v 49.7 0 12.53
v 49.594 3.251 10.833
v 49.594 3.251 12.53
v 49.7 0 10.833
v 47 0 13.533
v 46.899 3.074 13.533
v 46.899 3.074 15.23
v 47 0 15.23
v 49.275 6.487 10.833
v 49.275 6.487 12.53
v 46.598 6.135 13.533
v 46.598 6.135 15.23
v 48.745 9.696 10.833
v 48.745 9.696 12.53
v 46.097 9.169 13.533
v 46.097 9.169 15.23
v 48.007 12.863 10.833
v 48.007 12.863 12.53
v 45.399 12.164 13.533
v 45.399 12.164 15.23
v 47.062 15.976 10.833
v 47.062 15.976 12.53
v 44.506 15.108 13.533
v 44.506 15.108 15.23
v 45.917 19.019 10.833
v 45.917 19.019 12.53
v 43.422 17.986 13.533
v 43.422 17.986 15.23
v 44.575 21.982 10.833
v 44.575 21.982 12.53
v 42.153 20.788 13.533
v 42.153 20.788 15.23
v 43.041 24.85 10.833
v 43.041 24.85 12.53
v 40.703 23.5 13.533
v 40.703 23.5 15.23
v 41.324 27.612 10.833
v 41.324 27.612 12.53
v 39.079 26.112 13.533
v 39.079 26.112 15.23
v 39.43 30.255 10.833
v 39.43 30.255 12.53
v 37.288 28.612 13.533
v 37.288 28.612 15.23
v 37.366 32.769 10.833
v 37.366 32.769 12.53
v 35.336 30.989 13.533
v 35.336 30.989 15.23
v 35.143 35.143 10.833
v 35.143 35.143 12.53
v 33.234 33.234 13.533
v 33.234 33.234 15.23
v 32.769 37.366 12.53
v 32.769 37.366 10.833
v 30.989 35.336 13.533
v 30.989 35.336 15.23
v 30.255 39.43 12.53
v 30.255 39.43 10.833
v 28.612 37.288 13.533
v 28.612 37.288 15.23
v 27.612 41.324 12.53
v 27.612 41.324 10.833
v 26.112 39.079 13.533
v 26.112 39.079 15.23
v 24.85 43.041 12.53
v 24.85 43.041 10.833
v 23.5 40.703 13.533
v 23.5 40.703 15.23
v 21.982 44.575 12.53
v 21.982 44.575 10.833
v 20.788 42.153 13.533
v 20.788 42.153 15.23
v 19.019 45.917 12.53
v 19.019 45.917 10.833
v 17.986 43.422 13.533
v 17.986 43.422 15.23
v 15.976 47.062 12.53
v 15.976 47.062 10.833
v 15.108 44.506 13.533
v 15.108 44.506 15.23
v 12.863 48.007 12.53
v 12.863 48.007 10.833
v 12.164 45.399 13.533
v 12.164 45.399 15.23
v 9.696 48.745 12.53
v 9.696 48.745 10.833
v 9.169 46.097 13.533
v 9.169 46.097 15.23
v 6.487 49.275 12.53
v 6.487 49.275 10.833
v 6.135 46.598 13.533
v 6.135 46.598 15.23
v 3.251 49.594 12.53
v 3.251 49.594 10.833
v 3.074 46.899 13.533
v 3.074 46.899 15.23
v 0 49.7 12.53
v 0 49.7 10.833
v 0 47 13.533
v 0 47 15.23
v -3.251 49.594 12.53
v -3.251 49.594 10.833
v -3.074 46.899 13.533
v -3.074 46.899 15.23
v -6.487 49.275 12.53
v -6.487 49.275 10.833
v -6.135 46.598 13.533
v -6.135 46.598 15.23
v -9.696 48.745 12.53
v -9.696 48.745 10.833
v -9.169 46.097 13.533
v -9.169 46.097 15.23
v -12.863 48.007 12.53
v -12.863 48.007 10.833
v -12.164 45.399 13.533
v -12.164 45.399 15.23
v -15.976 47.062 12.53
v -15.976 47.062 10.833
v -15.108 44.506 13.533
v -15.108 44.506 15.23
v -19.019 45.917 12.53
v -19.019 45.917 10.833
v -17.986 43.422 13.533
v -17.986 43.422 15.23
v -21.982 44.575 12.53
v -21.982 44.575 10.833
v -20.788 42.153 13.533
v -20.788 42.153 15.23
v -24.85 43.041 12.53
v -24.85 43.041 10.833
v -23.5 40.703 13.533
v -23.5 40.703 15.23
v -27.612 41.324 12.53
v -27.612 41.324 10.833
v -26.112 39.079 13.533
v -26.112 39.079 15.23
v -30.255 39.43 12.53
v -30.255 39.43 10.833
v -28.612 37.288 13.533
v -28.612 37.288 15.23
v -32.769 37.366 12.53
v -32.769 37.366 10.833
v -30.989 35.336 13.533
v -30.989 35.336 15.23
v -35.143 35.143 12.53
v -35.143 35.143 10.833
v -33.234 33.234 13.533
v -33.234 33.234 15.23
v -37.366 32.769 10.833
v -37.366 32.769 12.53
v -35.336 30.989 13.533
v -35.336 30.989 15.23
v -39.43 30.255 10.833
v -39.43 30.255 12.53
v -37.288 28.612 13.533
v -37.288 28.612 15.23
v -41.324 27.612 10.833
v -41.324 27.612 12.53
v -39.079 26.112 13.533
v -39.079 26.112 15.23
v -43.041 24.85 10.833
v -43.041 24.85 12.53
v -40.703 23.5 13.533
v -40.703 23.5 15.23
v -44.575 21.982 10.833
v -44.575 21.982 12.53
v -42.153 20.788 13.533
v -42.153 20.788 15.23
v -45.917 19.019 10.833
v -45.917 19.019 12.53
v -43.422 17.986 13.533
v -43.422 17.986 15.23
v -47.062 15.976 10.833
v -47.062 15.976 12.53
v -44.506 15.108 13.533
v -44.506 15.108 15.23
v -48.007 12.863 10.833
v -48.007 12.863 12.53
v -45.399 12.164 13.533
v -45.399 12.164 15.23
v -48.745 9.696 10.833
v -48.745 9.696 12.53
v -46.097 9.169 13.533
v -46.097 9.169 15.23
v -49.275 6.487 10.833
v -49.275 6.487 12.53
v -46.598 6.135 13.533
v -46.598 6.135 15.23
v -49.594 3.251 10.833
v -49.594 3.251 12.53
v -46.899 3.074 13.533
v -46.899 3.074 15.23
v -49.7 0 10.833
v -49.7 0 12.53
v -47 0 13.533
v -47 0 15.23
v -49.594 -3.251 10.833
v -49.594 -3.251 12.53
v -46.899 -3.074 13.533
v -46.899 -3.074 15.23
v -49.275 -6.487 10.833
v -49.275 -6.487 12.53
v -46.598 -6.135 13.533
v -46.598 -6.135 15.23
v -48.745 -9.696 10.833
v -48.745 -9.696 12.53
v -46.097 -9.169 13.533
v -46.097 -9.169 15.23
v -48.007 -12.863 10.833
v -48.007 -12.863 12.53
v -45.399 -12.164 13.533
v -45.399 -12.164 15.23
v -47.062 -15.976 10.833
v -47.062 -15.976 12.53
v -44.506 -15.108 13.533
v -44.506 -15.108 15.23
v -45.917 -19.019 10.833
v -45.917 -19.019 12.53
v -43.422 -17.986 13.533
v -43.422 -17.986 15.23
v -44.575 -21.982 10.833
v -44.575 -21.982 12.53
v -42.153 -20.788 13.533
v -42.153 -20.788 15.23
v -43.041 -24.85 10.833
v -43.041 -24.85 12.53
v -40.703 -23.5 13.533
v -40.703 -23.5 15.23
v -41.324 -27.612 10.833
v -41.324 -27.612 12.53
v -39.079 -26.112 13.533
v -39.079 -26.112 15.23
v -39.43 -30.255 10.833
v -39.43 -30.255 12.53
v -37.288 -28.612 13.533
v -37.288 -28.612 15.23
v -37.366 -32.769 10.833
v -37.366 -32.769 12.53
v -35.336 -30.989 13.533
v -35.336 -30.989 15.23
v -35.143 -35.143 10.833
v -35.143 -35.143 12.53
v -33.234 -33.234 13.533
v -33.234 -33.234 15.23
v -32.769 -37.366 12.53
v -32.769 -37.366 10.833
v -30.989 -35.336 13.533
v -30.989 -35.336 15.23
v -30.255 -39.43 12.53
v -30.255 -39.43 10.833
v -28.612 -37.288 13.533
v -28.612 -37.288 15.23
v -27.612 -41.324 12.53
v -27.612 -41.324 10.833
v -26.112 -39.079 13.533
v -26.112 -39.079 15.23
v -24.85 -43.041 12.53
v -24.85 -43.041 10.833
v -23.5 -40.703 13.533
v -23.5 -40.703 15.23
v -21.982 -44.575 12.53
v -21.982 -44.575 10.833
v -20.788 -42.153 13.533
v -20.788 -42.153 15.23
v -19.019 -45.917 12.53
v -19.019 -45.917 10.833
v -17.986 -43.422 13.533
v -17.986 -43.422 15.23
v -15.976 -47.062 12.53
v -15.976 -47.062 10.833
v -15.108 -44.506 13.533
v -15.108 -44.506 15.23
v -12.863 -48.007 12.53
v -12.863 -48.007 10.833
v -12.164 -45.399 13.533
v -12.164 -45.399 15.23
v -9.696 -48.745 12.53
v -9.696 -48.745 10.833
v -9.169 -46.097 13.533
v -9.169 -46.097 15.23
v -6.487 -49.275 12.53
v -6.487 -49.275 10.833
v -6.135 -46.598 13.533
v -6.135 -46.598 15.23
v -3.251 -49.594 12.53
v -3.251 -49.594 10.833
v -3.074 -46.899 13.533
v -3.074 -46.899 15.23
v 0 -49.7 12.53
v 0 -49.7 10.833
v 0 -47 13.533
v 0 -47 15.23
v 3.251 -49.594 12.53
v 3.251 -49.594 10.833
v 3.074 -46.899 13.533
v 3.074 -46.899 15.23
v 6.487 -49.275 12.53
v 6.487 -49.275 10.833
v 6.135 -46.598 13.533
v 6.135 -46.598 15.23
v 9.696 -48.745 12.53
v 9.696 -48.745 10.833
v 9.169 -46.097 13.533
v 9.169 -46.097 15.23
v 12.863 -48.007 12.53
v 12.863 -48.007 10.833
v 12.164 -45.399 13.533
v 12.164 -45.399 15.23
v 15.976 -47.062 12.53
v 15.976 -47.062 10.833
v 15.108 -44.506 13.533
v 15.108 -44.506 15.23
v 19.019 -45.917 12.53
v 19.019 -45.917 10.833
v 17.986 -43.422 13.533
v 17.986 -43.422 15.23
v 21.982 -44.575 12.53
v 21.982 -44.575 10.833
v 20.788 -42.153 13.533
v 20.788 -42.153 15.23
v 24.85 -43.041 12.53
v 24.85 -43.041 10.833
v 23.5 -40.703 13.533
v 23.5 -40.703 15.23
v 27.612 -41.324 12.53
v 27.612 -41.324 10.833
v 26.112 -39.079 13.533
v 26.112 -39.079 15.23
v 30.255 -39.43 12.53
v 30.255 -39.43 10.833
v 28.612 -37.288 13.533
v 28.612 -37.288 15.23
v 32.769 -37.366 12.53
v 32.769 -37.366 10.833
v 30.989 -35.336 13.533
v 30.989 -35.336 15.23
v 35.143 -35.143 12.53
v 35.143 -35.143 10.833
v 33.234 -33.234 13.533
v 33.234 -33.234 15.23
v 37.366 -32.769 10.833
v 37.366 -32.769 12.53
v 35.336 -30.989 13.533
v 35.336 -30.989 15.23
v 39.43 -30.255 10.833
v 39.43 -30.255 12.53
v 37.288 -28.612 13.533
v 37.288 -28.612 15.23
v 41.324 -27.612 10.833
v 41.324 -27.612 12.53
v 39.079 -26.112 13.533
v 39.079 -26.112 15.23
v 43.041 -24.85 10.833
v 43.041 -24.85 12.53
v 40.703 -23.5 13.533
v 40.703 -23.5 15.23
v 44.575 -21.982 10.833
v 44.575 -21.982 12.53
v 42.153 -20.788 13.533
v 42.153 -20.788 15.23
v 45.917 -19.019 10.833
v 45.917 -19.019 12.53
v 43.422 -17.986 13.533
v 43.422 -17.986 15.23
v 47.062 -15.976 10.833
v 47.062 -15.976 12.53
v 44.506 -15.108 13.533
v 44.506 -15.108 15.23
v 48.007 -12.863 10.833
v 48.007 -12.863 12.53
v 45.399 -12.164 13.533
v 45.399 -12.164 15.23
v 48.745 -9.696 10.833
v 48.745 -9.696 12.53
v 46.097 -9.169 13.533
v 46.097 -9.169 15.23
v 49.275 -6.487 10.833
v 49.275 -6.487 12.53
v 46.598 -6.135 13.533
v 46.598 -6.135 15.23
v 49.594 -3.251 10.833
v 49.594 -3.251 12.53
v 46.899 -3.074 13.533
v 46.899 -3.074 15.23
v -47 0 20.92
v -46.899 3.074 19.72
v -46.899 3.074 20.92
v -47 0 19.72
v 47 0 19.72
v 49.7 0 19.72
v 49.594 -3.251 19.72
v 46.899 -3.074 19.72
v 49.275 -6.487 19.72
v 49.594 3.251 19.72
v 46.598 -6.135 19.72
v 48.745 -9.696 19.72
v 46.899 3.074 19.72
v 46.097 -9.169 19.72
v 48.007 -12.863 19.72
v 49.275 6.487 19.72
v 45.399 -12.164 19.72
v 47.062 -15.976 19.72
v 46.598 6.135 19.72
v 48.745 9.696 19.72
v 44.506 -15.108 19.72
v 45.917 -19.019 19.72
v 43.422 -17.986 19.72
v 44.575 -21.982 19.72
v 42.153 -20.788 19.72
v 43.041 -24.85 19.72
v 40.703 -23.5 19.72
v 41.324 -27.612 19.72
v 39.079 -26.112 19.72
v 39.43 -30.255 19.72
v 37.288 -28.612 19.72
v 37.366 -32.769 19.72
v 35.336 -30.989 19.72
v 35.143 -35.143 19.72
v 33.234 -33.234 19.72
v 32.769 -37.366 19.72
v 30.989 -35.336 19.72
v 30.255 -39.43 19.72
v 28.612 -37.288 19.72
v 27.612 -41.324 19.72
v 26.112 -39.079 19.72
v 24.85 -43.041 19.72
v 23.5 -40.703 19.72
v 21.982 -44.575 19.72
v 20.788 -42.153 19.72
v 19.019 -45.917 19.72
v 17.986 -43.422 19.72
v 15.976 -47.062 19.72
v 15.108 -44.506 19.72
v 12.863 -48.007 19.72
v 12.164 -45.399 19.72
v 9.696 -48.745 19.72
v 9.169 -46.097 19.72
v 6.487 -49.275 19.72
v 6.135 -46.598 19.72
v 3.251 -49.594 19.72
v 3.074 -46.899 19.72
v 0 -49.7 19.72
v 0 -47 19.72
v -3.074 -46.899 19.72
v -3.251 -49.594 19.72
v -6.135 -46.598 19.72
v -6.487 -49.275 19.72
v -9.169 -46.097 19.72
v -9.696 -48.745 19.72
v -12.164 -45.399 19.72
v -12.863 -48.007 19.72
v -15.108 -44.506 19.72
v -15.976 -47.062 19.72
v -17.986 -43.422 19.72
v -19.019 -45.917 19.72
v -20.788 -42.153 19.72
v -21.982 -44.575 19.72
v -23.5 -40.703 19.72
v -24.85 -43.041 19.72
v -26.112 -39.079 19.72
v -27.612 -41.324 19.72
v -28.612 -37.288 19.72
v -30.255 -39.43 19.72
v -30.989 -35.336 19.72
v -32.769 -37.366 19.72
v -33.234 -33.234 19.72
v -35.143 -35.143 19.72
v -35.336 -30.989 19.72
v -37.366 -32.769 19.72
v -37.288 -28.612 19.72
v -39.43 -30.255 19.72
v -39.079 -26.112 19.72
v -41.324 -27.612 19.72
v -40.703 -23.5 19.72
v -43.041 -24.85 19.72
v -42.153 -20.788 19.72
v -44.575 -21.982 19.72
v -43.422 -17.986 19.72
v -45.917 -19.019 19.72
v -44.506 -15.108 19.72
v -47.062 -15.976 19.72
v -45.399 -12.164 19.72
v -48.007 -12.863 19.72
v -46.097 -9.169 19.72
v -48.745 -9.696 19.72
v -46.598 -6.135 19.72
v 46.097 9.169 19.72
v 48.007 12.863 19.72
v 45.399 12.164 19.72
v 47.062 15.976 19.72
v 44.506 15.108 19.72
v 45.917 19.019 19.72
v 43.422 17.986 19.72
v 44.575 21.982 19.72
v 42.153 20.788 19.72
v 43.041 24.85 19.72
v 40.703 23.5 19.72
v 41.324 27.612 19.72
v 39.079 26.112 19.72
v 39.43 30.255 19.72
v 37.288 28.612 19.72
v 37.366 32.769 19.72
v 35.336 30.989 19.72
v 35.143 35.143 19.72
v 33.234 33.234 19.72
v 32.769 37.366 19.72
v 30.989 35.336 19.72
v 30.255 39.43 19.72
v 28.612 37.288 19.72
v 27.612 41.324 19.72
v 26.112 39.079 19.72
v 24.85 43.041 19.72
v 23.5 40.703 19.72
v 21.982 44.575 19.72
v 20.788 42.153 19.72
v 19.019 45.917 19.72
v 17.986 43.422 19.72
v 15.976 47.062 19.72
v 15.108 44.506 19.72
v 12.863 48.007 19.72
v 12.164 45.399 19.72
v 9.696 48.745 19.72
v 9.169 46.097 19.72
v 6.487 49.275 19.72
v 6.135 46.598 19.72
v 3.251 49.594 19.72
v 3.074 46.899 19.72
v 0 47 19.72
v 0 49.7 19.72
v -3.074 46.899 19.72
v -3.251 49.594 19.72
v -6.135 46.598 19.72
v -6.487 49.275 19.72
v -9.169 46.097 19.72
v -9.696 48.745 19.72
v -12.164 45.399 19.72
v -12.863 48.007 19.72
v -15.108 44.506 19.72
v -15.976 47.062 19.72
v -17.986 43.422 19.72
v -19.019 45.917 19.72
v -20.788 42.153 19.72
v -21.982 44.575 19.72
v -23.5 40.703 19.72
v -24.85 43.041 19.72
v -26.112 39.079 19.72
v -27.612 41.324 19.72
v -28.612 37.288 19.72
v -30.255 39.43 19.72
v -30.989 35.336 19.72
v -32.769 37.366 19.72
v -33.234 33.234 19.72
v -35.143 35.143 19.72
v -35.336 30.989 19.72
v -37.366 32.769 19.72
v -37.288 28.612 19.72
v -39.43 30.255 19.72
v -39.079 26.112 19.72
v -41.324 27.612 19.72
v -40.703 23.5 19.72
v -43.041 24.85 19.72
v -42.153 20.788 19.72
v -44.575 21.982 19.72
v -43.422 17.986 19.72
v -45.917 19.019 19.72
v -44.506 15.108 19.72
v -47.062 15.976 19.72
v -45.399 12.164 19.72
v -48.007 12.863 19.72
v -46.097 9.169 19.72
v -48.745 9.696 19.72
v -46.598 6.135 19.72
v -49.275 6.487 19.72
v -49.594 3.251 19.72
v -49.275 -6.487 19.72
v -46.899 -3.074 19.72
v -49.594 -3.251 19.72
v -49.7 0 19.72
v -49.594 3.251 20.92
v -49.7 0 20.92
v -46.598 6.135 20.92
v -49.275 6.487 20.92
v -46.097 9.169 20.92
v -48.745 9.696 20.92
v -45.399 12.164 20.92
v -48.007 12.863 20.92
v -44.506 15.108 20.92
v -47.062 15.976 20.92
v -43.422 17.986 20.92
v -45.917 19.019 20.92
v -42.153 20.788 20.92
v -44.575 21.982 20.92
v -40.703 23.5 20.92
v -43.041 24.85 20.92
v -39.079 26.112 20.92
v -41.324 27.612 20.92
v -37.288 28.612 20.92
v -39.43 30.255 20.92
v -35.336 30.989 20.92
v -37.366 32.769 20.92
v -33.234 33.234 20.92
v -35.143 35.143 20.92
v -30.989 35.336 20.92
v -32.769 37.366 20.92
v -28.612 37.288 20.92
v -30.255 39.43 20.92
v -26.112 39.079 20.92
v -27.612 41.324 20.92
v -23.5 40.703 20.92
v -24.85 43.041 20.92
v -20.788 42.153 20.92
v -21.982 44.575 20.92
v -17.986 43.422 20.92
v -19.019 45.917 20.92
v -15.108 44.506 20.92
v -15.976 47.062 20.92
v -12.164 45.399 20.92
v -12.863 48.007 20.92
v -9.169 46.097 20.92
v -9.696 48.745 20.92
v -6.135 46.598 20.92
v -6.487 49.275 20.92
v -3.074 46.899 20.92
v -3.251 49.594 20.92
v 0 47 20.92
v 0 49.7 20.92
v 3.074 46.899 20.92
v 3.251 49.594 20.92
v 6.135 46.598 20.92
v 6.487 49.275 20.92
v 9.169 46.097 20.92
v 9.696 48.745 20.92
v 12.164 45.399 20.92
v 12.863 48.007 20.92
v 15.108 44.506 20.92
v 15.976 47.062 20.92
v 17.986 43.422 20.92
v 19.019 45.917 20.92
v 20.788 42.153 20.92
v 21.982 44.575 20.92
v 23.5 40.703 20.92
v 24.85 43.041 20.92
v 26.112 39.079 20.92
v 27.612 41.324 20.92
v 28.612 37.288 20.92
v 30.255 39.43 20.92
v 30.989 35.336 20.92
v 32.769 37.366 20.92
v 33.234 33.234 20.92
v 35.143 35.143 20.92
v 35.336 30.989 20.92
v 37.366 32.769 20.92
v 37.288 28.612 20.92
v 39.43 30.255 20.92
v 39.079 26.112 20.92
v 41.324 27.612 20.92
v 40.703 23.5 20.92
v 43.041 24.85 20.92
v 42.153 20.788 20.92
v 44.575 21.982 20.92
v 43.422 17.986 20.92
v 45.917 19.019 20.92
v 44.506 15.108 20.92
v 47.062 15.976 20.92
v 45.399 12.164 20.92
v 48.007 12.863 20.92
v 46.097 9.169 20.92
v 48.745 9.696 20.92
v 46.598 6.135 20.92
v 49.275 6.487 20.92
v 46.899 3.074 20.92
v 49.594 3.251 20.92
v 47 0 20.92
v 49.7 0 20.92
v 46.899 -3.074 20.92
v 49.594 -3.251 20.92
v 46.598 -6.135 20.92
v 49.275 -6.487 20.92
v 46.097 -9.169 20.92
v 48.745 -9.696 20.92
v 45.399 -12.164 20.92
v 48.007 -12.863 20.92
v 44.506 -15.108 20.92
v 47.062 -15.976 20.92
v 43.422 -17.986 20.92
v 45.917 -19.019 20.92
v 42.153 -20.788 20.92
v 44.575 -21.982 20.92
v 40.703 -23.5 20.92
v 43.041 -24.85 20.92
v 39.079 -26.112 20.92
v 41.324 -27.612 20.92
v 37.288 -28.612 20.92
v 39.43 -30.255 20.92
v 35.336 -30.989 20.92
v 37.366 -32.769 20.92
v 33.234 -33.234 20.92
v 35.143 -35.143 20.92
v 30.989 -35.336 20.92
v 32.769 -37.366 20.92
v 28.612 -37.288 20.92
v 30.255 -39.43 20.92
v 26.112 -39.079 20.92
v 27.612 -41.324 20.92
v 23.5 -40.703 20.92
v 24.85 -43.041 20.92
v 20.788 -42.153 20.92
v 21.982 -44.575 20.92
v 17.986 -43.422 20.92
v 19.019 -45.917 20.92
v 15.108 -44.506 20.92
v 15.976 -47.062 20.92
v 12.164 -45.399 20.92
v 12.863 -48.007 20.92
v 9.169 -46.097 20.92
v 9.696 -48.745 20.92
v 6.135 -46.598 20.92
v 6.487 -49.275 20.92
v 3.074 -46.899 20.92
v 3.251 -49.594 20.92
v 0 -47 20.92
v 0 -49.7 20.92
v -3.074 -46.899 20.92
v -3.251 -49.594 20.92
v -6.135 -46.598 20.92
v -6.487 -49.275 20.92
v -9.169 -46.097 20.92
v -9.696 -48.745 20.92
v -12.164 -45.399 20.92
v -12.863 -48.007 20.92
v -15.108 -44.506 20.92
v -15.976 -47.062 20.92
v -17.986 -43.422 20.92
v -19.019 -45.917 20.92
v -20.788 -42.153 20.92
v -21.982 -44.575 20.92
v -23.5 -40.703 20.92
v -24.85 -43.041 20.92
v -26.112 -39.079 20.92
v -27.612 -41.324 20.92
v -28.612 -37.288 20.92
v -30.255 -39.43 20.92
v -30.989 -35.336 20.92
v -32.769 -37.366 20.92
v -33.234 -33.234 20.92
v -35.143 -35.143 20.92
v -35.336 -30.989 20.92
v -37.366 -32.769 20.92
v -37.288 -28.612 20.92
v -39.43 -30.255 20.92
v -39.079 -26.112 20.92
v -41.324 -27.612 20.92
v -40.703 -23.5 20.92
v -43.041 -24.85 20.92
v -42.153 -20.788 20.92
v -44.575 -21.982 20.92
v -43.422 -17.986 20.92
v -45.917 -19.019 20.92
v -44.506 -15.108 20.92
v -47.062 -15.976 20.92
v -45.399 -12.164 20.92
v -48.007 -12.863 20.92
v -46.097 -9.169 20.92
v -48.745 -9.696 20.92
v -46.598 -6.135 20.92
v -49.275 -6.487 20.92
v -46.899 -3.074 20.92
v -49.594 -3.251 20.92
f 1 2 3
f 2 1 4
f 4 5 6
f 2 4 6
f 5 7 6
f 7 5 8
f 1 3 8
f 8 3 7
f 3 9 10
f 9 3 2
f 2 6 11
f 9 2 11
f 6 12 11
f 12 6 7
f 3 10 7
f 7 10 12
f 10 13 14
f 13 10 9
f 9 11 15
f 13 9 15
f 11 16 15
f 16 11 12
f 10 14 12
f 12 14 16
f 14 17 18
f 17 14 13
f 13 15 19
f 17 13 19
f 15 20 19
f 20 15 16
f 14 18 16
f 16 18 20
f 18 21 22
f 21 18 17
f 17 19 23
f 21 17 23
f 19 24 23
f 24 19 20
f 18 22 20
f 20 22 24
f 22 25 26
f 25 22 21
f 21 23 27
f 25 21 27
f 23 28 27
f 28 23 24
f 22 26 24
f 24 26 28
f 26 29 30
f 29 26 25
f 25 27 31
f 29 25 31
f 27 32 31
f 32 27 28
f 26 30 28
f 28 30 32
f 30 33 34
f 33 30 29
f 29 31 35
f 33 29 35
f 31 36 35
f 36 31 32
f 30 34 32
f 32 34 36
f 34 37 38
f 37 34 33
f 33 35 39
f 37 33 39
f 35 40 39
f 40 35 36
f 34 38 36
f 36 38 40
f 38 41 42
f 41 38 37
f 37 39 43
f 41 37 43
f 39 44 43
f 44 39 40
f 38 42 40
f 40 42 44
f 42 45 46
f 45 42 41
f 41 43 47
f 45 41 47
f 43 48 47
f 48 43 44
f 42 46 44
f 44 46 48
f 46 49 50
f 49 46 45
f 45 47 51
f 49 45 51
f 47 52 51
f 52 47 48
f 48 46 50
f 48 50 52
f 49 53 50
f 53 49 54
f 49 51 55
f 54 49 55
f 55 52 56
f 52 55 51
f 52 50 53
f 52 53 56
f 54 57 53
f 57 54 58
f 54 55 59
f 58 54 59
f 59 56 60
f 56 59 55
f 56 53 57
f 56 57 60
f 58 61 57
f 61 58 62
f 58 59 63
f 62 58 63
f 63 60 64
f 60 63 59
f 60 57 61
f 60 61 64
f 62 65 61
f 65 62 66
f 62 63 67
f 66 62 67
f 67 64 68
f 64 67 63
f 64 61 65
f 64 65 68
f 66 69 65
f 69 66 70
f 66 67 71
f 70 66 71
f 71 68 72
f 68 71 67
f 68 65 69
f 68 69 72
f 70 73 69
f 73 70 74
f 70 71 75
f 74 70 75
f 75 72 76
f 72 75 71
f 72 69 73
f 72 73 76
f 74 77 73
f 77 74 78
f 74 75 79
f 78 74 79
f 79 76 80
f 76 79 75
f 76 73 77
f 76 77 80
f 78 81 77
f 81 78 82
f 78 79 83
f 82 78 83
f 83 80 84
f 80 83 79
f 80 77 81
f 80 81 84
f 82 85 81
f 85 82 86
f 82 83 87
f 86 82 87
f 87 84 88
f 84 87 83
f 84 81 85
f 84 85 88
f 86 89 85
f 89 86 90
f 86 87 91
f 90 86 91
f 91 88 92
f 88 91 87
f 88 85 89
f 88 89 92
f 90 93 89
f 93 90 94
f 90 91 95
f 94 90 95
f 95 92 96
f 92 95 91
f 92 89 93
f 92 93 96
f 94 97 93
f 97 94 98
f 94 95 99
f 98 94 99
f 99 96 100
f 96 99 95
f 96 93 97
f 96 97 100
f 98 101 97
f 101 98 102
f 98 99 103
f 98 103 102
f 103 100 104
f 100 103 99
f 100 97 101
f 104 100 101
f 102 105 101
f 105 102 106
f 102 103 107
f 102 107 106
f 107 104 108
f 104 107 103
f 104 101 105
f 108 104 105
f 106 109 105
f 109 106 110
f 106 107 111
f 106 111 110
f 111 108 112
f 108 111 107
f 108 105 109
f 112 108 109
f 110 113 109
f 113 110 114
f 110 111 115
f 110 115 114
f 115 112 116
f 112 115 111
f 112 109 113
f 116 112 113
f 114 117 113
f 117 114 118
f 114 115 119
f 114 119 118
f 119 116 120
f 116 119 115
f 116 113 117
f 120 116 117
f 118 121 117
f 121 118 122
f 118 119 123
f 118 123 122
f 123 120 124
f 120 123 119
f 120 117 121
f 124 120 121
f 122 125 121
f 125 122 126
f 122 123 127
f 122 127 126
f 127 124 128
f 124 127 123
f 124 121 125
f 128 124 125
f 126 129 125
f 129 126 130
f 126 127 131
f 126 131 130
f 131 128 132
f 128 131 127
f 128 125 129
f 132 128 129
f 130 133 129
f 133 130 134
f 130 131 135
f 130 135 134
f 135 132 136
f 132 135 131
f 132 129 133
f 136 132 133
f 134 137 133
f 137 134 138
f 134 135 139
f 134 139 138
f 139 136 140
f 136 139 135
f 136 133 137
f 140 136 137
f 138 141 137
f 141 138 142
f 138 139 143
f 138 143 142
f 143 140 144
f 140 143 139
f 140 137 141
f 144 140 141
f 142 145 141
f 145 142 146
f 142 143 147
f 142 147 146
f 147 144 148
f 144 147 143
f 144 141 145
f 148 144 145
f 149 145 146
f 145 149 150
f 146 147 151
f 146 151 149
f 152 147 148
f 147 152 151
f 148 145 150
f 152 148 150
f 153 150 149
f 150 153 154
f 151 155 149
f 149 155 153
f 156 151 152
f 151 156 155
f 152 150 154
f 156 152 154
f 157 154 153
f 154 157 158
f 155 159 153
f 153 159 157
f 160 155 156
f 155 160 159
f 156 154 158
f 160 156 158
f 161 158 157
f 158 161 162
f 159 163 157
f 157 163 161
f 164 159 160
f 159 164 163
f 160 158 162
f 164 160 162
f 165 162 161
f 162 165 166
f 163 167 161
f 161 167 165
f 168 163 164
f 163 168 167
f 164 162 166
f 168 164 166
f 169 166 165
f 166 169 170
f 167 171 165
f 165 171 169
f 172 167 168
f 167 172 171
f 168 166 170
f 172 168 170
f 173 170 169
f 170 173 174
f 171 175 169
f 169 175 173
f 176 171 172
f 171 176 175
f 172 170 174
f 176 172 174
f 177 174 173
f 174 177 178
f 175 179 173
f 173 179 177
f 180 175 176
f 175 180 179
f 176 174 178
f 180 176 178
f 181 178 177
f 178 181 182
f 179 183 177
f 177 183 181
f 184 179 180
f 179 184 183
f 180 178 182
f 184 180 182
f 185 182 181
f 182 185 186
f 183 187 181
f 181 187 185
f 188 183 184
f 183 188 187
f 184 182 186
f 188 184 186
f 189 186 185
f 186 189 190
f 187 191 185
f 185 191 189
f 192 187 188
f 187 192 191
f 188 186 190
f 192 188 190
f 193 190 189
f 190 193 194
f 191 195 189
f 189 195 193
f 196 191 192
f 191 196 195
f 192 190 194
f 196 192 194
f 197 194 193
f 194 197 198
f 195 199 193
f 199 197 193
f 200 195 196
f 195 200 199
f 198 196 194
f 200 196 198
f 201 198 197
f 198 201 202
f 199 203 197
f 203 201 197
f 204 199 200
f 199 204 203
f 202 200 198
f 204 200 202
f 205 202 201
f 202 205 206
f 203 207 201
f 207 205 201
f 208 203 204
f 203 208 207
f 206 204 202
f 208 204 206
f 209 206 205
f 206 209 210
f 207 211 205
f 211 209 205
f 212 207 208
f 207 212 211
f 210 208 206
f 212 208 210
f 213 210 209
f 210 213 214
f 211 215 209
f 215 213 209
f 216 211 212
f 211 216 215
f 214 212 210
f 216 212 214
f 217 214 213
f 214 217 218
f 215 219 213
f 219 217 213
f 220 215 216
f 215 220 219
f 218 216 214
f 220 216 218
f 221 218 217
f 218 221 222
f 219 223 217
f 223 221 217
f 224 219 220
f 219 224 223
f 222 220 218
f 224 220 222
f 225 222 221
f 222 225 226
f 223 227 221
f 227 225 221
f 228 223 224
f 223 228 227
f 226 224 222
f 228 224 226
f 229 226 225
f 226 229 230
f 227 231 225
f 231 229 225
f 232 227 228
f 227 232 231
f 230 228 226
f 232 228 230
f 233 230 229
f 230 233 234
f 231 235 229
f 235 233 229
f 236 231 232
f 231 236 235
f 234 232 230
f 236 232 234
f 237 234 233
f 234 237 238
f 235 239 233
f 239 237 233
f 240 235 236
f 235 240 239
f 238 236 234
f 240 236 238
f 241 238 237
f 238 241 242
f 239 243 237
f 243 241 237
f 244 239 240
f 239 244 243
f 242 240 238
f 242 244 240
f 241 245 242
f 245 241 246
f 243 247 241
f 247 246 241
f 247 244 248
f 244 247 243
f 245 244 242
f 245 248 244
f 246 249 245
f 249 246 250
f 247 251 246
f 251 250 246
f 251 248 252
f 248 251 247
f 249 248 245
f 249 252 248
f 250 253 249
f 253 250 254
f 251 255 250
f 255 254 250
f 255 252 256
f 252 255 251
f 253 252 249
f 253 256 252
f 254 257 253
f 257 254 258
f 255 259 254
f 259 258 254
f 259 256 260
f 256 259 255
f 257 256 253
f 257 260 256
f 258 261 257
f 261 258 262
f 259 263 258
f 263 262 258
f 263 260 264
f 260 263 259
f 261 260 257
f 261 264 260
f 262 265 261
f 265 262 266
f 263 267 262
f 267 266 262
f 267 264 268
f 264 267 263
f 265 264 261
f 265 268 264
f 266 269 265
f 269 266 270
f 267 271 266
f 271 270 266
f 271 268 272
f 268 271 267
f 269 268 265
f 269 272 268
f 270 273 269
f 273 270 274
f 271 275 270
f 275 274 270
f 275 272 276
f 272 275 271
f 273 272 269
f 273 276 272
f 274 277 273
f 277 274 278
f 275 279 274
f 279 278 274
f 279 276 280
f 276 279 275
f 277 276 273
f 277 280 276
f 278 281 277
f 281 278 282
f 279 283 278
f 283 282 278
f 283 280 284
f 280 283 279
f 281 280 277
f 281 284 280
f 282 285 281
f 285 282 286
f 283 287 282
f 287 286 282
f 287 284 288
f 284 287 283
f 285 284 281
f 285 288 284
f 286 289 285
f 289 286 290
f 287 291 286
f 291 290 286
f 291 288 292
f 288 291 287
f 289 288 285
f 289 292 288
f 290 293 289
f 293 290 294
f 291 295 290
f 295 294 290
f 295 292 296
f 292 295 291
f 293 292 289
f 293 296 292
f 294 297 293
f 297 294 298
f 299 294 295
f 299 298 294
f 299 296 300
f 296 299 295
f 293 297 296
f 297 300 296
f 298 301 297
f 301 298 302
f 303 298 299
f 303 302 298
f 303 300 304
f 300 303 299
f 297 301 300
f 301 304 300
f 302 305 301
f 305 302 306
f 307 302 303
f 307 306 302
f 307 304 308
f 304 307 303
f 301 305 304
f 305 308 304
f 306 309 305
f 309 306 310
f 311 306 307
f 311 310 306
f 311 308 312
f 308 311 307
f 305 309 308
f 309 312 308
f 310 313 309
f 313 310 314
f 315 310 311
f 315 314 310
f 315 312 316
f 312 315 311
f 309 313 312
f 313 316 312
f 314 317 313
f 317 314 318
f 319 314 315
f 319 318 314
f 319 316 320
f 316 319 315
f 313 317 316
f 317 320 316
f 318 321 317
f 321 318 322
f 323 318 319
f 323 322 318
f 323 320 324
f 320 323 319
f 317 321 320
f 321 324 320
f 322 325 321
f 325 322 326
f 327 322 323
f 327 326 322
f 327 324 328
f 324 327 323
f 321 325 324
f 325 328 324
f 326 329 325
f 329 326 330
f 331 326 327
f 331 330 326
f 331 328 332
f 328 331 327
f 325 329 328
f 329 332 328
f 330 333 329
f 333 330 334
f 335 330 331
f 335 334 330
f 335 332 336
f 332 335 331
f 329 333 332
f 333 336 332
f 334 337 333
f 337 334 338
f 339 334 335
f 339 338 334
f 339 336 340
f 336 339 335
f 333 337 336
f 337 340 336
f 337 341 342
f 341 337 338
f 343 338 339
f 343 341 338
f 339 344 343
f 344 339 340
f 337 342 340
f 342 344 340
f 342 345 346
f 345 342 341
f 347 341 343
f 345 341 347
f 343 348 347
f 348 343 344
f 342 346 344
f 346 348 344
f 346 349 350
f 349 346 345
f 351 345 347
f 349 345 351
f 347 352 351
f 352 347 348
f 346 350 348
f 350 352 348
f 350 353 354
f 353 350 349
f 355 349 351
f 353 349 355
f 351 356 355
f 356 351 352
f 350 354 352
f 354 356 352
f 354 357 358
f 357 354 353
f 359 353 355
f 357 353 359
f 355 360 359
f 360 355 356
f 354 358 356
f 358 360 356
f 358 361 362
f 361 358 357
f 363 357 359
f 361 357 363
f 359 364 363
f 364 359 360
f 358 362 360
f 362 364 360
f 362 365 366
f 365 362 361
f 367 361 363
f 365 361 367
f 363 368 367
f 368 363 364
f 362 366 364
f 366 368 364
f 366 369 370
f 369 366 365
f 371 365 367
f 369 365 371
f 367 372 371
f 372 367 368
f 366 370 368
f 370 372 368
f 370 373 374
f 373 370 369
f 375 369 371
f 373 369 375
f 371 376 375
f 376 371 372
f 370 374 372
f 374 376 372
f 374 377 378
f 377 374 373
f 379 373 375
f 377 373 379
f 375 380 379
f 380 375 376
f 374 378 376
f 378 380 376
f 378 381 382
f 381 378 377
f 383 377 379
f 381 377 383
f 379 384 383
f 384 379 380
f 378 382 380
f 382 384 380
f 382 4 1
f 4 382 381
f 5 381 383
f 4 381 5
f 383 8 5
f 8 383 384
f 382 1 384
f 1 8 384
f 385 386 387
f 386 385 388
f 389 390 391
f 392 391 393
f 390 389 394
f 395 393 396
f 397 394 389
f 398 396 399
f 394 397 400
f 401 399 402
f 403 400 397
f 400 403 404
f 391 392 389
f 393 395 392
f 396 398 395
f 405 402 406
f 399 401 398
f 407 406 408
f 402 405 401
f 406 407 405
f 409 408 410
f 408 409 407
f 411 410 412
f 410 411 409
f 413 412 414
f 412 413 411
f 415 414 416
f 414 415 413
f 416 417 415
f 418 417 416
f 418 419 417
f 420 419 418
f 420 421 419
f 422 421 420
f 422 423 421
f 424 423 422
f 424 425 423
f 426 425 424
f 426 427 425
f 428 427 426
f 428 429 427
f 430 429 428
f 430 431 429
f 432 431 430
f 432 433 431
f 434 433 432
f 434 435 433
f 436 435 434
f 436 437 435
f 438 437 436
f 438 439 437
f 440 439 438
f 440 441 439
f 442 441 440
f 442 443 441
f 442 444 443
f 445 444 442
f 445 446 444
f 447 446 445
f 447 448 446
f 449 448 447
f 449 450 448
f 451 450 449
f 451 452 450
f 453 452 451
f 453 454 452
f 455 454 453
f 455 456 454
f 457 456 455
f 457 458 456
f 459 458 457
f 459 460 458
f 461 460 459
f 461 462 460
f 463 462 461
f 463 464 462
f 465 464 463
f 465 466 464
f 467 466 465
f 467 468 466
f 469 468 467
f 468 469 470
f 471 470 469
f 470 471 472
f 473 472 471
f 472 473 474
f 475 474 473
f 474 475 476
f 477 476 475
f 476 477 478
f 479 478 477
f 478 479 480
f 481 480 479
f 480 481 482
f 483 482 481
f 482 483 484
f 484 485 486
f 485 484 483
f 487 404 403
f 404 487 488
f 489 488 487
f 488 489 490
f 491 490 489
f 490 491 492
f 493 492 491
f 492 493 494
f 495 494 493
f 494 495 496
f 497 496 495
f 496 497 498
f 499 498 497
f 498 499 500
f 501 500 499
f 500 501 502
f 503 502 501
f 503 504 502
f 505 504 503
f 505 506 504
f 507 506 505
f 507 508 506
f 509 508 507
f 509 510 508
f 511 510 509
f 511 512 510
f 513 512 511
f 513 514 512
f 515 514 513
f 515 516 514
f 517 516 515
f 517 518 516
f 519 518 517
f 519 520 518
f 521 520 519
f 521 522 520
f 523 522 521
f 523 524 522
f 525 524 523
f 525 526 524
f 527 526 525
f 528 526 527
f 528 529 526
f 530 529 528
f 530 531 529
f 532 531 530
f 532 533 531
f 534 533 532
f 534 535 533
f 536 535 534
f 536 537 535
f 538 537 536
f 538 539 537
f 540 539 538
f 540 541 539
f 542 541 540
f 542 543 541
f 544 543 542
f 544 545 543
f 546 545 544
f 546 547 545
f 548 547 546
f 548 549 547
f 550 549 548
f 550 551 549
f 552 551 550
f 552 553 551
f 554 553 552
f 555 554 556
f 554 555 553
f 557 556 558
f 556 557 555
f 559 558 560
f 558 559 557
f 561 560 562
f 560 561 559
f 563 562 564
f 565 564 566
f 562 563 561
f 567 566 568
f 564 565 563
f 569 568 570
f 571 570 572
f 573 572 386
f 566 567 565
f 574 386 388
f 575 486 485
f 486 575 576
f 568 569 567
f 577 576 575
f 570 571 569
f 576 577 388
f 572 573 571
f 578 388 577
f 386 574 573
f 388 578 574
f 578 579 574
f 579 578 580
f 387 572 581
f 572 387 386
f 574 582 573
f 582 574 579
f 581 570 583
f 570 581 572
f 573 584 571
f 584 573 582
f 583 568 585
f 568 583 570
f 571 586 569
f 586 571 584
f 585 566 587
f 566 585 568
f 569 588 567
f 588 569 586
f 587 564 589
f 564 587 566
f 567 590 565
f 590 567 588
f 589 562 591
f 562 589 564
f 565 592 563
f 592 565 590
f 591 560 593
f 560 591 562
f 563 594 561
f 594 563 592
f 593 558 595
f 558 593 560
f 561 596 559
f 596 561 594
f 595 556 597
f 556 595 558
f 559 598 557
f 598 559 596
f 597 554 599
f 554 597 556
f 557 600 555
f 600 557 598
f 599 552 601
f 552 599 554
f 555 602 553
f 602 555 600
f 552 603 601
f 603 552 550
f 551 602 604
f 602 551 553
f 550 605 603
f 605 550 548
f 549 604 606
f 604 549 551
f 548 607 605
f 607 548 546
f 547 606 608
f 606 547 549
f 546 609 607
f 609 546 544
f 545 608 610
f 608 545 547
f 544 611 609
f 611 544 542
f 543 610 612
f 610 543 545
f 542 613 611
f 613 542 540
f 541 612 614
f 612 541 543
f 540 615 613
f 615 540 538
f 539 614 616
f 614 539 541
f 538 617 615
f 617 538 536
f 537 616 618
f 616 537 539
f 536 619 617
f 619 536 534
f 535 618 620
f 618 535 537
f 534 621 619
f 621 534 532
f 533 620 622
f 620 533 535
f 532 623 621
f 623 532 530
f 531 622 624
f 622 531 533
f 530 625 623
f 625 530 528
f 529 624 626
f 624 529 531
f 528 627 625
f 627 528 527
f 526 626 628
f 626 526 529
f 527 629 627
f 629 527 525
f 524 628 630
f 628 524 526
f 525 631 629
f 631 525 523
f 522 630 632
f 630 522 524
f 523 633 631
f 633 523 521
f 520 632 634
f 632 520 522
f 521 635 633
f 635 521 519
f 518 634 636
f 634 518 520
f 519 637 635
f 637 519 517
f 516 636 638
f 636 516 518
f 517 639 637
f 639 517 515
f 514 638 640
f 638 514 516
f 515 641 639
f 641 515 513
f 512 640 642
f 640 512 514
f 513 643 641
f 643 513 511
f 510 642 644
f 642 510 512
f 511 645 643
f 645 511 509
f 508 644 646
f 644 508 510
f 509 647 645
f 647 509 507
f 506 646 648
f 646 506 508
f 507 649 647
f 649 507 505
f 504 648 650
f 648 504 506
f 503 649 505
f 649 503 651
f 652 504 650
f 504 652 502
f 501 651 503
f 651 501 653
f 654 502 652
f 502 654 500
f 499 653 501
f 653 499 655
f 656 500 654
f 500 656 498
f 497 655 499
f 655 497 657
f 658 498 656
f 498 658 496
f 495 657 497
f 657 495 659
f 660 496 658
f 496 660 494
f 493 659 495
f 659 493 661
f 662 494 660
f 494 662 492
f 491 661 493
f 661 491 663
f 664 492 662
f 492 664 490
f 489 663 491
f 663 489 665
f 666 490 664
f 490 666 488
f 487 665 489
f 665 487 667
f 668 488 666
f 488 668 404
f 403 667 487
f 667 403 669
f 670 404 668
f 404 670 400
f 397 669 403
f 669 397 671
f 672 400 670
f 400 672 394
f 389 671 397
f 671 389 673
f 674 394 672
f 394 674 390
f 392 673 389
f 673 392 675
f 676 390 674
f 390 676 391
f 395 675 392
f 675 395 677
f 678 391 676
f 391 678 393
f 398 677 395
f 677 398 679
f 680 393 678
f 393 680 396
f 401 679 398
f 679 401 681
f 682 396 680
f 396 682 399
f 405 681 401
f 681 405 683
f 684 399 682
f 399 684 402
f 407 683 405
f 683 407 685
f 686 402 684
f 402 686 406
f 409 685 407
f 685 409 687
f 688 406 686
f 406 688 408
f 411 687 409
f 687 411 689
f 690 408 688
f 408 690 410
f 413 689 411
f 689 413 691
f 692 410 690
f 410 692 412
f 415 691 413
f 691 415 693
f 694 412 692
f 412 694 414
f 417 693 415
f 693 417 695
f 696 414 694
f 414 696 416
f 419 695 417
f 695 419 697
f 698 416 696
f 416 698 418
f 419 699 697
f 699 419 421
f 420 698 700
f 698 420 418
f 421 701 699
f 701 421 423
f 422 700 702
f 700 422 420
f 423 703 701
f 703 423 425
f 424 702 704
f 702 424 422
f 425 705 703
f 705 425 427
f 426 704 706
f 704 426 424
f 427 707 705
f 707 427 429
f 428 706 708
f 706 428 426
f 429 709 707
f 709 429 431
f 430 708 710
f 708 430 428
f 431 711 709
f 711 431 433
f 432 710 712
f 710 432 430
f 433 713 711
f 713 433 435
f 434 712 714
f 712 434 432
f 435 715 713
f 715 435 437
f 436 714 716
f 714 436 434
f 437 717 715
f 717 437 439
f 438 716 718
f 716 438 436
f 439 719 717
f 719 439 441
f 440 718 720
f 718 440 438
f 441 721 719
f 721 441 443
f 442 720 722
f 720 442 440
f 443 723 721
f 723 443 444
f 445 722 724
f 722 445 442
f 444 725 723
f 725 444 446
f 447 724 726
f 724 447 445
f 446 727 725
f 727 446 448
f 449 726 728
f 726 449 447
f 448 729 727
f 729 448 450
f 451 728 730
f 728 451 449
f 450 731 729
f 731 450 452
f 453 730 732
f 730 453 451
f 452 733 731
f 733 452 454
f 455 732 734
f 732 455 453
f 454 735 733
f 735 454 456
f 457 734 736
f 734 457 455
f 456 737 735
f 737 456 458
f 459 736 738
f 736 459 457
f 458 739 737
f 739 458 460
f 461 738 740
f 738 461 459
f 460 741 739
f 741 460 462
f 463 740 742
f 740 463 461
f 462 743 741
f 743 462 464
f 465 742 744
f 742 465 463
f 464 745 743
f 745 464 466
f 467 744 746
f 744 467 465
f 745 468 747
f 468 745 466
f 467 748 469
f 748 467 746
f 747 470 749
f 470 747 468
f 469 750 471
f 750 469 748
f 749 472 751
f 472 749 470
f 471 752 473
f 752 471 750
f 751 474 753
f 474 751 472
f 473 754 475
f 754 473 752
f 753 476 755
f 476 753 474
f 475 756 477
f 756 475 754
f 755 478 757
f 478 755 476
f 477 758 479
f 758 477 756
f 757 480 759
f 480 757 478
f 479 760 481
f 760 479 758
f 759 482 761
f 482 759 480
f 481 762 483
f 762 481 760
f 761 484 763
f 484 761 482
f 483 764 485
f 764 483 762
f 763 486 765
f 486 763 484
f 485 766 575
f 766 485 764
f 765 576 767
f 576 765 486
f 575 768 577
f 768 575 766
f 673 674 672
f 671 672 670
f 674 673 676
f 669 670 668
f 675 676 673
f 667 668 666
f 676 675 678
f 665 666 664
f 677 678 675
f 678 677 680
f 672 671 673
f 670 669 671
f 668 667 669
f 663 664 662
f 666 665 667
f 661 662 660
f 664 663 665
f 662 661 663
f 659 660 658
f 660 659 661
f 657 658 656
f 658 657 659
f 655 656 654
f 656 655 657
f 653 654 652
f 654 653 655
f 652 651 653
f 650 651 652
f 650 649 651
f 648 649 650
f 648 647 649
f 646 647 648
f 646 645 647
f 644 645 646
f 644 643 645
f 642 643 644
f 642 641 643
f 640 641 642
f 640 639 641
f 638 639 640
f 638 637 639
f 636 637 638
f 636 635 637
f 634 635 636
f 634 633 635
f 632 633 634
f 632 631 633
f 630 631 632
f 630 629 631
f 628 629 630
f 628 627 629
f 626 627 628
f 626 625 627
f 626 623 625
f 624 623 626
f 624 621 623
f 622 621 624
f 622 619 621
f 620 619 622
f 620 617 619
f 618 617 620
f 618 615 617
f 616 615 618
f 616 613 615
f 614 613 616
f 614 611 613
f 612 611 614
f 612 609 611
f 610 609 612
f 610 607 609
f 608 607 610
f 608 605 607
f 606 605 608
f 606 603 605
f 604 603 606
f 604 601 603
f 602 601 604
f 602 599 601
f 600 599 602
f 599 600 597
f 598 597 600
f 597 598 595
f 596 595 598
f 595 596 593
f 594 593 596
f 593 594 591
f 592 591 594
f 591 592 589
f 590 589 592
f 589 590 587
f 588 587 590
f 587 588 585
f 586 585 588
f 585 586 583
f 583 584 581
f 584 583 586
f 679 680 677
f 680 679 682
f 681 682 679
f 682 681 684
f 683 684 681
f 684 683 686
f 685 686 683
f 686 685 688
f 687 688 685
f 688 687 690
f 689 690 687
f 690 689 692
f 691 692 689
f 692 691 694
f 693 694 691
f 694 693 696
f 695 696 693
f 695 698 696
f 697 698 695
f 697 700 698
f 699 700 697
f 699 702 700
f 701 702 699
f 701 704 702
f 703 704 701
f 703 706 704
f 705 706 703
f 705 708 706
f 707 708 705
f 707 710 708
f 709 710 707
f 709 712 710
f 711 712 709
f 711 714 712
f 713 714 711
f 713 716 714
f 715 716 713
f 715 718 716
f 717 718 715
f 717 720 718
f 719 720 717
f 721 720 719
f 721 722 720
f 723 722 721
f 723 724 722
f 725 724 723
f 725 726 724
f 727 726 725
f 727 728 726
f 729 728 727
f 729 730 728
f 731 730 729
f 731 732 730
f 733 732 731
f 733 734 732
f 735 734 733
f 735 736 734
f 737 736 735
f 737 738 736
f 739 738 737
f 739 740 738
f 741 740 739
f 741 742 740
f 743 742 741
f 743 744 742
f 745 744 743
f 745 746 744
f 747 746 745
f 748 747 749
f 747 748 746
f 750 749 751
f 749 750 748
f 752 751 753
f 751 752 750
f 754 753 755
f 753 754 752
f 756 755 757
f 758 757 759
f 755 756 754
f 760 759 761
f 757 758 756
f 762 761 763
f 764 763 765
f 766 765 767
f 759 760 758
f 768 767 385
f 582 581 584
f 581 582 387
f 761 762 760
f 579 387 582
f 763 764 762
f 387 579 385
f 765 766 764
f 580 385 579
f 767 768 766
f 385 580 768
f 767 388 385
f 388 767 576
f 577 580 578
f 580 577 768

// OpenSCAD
include <../lib/servo-duct-manifold-lib.scad>;
$fn = 96;
socket_coupler_gasket();
